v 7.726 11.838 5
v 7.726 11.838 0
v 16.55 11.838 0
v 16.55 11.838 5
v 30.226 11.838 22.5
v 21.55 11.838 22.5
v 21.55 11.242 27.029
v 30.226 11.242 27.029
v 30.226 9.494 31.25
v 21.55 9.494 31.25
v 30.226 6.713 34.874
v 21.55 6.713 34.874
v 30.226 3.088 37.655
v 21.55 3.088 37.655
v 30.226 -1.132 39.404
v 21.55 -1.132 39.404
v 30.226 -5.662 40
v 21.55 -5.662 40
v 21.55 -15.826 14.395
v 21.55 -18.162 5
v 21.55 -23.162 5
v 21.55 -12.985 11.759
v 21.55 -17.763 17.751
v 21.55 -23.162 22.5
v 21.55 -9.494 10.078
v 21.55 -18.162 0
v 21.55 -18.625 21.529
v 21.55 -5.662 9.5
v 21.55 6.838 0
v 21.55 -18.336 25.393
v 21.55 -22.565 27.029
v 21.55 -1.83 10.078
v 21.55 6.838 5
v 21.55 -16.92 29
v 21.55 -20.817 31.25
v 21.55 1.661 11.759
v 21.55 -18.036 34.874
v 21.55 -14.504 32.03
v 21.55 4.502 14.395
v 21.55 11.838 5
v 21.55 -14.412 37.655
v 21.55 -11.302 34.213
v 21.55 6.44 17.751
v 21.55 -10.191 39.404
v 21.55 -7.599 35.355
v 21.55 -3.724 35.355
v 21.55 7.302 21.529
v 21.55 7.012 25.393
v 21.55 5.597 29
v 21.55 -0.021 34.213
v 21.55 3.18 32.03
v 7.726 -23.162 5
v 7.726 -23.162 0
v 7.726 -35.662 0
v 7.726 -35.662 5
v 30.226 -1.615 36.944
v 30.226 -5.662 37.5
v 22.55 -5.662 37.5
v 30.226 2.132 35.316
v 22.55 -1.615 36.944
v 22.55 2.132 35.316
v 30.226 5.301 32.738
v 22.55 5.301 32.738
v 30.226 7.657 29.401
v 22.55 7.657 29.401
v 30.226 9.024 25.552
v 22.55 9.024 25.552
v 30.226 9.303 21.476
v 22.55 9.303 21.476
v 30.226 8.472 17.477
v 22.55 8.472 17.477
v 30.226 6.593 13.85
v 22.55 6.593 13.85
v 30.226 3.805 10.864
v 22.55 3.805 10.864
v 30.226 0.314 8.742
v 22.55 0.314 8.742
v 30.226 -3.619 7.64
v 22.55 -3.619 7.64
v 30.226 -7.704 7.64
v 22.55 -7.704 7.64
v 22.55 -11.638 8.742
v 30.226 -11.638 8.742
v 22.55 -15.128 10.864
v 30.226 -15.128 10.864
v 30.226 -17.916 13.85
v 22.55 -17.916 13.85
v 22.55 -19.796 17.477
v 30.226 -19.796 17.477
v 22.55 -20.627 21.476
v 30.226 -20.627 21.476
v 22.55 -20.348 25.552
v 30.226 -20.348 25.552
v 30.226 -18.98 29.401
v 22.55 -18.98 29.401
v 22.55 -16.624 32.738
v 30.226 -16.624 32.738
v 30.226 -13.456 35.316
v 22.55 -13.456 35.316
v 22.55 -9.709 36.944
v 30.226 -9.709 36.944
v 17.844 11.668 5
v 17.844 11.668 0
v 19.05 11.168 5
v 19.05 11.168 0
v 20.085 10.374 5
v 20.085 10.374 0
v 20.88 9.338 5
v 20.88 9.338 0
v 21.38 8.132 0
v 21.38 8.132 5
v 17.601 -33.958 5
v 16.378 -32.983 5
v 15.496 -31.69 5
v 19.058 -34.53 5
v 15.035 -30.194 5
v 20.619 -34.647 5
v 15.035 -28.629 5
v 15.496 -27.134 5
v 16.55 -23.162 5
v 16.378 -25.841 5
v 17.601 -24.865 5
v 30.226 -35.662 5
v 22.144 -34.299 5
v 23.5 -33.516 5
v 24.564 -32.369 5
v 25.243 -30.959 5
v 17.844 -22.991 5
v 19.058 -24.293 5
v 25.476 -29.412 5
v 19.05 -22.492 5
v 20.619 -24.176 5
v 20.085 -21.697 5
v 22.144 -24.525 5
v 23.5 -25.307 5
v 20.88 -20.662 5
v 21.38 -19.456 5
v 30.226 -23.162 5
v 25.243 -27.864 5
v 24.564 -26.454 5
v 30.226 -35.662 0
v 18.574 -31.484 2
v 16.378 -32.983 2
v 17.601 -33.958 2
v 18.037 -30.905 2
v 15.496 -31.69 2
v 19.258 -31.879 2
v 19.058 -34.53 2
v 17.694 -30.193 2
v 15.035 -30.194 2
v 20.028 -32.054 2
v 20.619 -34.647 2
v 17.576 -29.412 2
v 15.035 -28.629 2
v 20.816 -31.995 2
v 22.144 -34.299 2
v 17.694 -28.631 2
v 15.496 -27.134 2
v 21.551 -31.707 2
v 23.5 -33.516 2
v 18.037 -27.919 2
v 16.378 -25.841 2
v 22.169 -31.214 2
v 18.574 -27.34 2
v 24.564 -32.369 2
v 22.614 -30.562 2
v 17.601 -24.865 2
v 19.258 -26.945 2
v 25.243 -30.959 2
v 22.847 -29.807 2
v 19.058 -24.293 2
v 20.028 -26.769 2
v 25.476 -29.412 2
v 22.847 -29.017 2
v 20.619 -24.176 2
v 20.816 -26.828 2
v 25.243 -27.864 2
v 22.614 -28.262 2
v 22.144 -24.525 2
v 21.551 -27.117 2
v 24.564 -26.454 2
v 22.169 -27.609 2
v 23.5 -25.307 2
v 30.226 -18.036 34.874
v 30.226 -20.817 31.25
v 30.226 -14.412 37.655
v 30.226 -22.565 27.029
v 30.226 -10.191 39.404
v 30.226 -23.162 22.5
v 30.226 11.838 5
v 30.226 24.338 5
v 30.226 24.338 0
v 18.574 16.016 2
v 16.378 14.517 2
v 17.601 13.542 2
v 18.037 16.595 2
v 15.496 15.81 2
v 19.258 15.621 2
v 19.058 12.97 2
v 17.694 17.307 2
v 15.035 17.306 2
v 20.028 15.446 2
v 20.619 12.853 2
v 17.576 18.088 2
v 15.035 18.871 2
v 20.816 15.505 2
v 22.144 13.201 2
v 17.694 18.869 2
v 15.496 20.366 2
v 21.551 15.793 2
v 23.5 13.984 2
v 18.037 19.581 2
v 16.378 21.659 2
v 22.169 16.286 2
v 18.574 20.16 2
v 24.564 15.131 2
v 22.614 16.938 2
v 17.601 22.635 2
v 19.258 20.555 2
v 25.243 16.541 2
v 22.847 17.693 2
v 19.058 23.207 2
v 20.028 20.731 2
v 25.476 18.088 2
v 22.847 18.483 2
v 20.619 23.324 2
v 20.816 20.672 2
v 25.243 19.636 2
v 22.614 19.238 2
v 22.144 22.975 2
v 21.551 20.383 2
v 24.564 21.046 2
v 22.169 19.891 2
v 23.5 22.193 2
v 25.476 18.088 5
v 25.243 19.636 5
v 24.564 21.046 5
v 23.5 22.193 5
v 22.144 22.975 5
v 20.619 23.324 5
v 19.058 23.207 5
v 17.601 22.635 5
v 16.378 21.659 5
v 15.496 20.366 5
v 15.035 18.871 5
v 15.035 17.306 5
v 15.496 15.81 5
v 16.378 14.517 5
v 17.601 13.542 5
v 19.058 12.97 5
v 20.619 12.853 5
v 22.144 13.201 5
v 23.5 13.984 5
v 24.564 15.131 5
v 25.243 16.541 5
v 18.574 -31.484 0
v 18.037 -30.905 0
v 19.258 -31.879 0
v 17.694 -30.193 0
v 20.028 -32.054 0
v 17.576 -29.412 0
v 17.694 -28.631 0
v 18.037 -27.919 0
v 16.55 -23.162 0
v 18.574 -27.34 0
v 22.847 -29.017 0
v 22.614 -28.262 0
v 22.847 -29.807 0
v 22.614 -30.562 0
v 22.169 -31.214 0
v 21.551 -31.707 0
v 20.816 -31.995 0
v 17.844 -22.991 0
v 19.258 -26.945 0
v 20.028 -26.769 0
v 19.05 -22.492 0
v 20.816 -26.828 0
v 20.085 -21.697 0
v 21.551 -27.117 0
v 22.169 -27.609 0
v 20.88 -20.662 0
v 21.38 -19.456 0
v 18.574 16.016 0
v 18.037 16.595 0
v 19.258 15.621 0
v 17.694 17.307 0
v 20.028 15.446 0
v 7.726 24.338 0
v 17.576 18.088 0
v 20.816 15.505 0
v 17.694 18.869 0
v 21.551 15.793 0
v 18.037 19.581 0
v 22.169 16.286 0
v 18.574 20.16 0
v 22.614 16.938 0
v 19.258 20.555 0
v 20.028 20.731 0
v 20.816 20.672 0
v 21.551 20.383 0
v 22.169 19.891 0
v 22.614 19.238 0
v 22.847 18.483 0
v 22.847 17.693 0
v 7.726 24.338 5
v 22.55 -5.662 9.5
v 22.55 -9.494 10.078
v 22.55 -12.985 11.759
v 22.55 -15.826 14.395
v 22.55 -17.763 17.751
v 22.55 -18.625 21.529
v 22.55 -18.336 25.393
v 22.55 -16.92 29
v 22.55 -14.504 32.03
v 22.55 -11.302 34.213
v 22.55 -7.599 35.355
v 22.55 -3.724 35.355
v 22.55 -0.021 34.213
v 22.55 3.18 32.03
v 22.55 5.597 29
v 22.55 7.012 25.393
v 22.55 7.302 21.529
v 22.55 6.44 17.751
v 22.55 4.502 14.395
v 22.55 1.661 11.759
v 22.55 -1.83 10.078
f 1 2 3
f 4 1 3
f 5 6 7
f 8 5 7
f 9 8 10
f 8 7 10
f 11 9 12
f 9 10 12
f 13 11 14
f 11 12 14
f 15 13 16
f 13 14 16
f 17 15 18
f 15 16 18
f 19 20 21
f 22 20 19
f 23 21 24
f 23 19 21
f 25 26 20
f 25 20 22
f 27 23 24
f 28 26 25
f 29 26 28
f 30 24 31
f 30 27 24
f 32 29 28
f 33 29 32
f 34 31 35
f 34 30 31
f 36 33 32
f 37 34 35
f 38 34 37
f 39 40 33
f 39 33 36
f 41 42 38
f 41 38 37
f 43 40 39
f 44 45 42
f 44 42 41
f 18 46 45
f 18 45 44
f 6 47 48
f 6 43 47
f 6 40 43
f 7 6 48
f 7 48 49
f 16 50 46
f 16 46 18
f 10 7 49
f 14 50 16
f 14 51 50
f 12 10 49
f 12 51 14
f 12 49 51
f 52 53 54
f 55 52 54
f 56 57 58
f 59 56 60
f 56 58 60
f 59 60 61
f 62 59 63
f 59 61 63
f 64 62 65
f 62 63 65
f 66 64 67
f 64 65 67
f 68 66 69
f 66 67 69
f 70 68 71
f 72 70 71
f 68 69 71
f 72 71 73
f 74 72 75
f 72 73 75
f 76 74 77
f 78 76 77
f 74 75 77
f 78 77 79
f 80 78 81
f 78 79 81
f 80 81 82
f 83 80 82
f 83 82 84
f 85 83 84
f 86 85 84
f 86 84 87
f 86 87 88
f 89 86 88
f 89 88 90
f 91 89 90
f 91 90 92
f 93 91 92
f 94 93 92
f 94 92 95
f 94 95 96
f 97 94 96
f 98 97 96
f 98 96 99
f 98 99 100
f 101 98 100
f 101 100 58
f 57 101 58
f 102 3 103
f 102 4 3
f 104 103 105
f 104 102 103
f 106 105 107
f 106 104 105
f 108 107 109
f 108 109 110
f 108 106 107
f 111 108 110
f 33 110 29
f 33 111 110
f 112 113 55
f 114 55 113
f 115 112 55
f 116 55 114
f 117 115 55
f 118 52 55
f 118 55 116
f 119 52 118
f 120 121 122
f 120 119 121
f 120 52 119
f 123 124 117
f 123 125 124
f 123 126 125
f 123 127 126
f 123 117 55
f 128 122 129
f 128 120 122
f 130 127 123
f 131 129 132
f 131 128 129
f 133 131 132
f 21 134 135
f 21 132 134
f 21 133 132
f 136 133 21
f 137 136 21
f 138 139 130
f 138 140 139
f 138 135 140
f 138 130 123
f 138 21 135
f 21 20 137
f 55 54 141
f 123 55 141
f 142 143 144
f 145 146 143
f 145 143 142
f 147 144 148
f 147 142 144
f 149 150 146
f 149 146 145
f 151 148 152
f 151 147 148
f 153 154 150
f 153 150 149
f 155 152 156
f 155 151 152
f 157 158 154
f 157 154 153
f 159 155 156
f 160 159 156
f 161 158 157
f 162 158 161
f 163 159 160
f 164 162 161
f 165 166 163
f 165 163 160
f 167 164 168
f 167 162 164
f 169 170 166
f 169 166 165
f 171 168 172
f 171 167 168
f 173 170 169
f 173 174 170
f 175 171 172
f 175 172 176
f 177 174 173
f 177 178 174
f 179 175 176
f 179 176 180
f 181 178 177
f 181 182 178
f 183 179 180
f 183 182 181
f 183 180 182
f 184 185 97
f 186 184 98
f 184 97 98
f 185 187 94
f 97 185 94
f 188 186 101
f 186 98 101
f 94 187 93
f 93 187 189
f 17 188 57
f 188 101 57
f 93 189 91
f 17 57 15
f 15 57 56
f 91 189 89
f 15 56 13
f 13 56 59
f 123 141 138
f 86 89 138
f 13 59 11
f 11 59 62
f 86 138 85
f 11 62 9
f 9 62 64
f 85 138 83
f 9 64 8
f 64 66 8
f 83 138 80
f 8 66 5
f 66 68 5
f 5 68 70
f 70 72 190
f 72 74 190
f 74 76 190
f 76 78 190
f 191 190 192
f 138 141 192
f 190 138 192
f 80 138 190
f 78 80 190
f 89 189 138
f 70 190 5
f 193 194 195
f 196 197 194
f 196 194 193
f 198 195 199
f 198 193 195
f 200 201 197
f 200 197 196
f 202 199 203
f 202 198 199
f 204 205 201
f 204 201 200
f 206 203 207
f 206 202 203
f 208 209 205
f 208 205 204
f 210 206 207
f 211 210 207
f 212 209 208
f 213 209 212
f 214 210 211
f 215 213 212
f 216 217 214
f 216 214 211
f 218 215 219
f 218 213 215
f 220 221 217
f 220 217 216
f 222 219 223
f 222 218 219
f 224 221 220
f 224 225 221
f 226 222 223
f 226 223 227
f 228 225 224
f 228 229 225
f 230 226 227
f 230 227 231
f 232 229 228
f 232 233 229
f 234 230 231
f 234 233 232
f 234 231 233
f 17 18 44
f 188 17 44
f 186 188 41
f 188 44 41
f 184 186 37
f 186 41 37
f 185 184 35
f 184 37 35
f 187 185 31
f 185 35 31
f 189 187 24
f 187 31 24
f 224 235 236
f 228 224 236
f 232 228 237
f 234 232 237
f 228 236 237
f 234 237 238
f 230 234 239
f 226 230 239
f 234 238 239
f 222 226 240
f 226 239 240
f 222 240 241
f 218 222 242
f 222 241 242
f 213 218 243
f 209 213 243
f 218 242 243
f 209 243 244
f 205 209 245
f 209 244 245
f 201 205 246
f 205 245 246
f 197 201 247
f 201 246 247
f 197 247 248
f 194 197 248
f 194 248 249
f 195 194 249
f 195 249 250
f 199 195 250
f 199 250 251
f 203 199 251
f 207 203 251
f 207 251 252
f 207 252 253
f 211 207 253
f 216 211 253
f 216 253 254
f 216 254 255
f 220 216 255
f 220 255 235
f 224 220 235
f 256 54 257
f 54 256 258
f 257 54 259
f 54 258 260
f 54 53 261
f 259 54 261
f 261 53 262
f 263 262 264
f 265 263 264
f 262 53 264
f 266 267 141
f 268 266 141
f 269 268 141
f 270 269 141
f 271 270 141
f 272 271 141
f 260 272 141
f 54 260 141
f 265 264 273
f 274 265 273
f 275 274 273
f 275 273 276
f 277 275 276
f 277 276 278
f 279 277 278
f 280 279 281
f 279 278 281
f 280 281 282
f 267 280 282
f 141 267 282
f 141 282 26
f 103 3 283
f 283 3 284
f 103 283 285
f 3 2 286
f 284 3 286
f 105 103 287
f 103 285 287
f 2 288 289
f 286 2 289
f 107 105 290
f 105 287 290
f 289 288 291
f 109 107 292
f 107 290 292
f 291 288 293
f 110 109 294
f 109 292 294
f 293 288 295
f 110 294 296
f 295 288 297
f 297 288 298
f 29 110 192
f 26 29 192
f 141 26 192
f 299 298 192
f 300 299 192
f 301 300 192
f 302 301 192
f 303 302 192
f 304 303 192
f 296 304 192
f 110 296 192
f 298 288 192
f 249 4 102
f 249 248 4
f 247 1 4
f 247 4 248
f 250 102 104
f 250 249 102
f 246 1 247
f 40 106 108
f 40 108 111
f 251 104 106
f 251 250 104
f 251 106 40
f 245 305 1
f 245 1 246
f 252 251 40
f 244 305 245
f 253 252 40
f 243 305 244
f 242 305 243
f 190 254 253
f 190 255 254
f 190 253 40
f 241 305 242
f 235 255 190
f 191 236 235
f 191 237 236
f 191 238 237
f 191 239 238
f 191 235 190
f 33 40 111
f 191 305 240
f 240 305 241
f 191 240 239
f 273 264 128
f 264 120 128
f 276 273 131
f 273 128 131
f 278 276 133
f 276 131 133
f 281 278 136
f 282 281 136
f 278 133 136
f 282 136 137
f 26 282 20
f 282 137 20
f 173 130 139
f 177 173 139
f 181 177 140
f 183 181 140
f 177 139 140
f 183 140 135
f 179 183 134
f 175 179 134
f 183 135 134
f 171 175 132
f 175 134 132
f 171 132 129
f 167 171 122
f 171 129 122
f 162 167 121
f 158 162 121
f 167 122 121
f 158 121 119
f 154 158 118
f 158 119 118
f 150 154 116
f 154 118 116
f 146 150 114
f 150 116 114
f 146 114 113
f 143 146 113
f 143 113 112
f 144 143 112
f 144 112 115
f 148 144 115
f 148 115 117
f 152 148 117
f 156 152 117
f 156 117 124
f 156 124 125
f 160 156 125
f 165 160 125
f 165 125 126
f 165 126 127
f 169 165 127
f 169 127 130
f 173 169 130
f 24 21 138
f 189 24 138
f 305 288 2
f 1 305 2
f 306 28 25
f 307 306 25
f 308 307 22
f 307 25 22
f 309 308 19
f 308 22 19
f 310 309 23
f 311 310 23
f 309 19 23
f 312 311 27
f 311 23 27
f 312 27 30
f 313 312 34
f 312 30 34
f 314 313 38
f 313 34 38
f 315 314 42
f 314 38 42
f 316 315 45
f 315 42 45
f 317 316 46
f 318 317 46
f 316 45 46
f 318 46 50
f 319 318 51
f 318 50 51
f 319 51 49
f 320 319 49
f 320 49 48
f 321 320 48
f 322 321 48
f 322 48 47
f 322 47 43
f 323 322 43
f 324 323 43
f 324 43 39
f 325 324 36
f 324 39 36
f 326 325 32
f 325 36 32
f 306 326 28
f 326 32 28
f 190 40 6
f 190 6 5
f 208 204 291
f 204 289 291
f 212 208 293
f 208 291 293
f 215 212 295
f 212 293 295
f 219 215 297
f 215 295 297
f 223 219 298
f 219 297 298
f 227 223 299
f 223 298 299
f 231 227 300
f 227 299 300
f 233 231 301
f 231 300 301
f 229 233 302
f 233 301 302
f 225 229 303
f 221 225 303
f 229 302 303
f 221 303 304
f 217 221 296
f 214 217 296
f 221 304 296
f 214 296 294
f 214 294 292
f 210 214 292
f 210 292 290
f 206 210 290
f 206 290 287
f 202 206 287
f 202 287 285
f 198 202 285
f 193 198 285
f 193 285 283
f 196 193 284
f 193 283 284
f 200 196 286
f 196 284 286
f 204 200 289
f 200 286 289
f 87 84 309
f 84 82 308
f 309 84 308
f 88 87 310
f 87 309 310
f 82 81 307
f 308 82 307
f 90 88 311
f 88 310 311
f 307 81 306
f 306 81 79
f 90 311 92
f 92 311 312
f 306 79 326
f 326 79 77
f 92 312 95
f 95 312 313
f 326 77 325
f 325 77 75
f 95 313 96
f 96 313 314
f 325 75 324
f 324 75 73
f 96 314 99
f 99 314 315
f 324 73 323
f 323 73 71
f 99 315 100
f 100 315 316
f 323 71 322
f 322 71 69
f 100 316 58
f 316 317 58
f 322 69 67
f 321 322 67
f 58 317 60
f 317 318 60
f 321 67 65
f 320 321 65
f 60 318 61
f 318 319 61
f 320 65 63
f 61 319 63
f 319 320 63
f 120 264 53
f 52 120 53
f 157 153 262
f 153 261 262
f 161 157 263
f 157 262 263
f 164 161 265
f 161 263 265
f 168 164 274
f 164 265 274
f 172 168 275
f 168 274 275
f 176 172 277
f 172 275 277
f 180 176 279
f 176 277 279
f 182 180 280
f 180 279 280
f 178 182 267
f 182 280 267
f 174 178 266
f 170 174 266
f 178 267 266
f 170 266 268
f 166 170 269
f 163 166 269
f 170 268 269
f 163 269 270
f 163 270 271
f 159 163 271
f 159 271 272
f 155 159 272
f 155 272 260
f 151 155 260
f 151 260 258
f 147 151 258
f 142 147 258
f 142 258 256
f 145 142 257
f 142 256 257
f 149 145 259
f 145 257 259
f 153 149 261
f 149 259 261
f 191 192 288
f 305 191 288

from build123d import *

# Parameters (mm, degrees)
EXTRUDE_2_DEPTH                = 5
SKETCH_4_W                     = 8.676470589
SKETCH_4_H                     = 35
SKETCH_4_W_2                   = 8.676470588
EXTRUDE_15_DEPTH               = 35
CUT_EXTRUDE_1_DEPTH            = 45
SKETCH_6_R                     = 15
CUT_EXTRUDE_2_DEPTH            = 45
FILLET_1_R                     = 5
EXTRUDE_START                  = -1
SKETCH_7_R                     = 15
SKETCH_7_R_2                   = 13
EXTRUDE_16_DEPTH               = 1
SKETCH_8_R                     = 15
SKETCH_8_R_2                   = 13
EXTRUDE_17_DEPTH               = 1
SPLIT_BODIES_1_SURFACE_1_BACK  = 86
SPLIT_BODIES_1_SURFACE_1_DEPTH = 172
SPLIT_BODIES_1_SURFACE_2_BACK  = 86
SPLIT_BODIES_1_SURFACE_2_DEPTH = 172
HOLE_WIZARD_1_D                = 5.3
HOLE_WIZARD_1_CBORE_D          = 10.5
HOLE_WIZARD_1_CBORE_DEPTH      = 3


with BuildPart() as part:
    # 草图2 → 凸台-拉伸2 (new body)
    with BuildSketch(Plane.XY):
        Polygon((7.726423565, 24.338235294), (-14.773576435, 24.338235294), (-14.773576435, -35.661764706), (7.726423565, -35.661764706), (7.726423565, -23.161764706), (-6.097105846, -23.161764706), (-6.097105846, 11.838235294), (7.726423565, 11.838235294), align=None)
        Polygon((30.226423565, 24.338235294), (7.726423565, 24.338235294), (7.726423565, 11.838235294), (21.549952977, 11.838235294), (21.549952977, -23.161764706), (7.726423565, -23.161764706), (7.726423565, -35.661764706), (30.226423565, -35.661764706), align=None)
    extrude(amount=EXTRUDE_2_DEPTH)

    # 草图4 → 凸台-拉伸15 (add)
    with BuildSketch(Plane.XY.offset(5)):
        with Locations((-10.435341141, -5.661764706)):
            Rectangle(SKETCH_4_W, SKETCH_4_H)
        with Locations((25.888188271, -5.661764706)):
            Rectangle(SKETCH_4_W_2, SKETCH_4_H)
    extrude(amount=EXTRUDE_15_DEPTH)

    # 草图5 → 切除-拉伸1 (cut)
    with BuildSketch(Plane.ZY.offset(14.773576435)):
        with BuildLine():
            Line((40, -23.161764706), (40, -5.661764706))
            ThreePointArc((40, -5.661764706), (34.874368671, -18.036133377), (22.5, -23.161764706))
            Line((22.5, -23.161764706), (40, -23.161764706))
        make_face()
        with BuildLine():
            ThreePointArc((22.5, 11.838235294), (34.874368671, 6.712603965), (40, -5.661764706))
            Line((40, -5.661764706), (40, 11.838235294))
            Line((40, 11.838235294), (22.5, 11.838235294))
        make_face()
    extrude(amount=-CUT_EXTRUDE_1_DEPTH, mode=Mode.SUBTRACT)

    # 草图6 → 切除-拉伸2 (cut)
    with BuildSketch(Plane.ZY.offset(14.773576435)):
        with Locations((22.5, -5.661764706)):
            Circle(SKETCH_6_R)
    extrude(amount=-CUT_EXTRUDE_2_DEPTH, mode=Mode.SUBTRACT)

    # 圆角1
    fillet_1_edges = [part.edges().sort_by_distance(p)[0] for p in [
        (-6.097105846, 11.838235294, 2.5),
        (-6.097105846, -23.161764706, 2.5),
        (21.549952977, -23.161764706, 2.5),
        (21.549952977, 11.838235294, 2.5),
    ]]
    fillet(fillet_1_edges, radius=FILLET_1_R)

    # 草图7 → 凸台-拉伸16 (add)
    with BuildSketch(Plane(origin=(-6.097105846, 0, 0), x_dir=(0, 0, -1), z_dir=(1, 0, 0)).offset(EXTRUDE_START)):
        with Locations(Location((-22.5, -5.661764706, 0), (0, 0, 180))):
            Circle(SKETCH_7_R)
        with Locations((-22.5, -5.661764706)):
            Circle(SKETCH_7_R_2, mode=Mode.SUBTRACT)
    extrude(amount=EXTRUDE_16_DEPTH)

    # 草图8 → 凸台-拉伸17 (add)
    with BuildSketch(Plane.ZY.offset(-21.549952977)):
        with Locations((22.5, -5.661764706)):
            Circle(SKETCH_8_R)
        with Locations(Location((22.5, -5.661764706, 0), (0, 0, 180))):
            Circle(SKETCH_8_R_2, mode=Mode.SUBTRACT)
    extrude(amount=-EXTRUDE_17_DEPTH)


with BuildPart() as body_2:
    # Split Bodies 1: the piece behind the surface
    add(part.part)
    # Split Bodies 1 surface: a surface, the sketch's curves swept straight by 172 mm
    with BuildLine(Plane.XY.offset(5).offset(-SPLIT_BODIES_1_SURFACE_1_BACK), mode=Mode.PRIVATE) as split_bodies_1_surface_1_path:
        Line((7.726423565, 24.338235294), (7.726423565, -35.661764706))
    split_bodies_1_surface_1 = Shell.extrude(split_bodies_1_surface_1_path.wire(), (0 * SPLIT_BODIES_1_SURFACE_1_DEPTH, 0 * SPLIT_BODIES_1_SURFACE_1_DEPTH, 1 * SPLIT_BODIES_1_SURFACE_1_DEPTH))
    split(bisect_by=split_bodies_1_surface_1, keep=Keep.BOTTOM)


with BuildPart() as part_1:
    add(part.part)

    # Split Bodies 1: split by a surface, the side it looks to stays
    # Split Bodies 1 surface: a surface, the sketch's curves swept straight by 172 mm
    with BuildLine(Plane.XY.offset(5).offset(-SPLIT_BODIES_1_SURFACE_2_BACK), mode=Mode.PRIVATE) as split_bodies_1_surface_2_path:
        Line((7.726423565, 24.338235294), (7.726423565, -35.661764706))
    split_bodies_1_surface_2 = Shell.extrude(split_bodies_1_surface_2_path.wire(), (0 * SPLIT_BODIES_1_SURFACE_2_DEPTH, 0 * SPLIT_BODIES_1_SURFACE_2_DEPTH, 1 * SPLIT_BODIES_1_SURFACE_2_DEPTH))
    split(bisect_by=split_bodies_1_surface_2, keep=Keep.TOP)

    # 大小平盘开槽螺钉柱孔1 (through all)
    with Locations(Plane(origin=(20.226423565, -29.411764706, 5), x_dir=(1, 0, 0), z_dir=(0, 0, 1))):
        with Locations((0, 0), (0, 47.5)):
            CounterBoreHole(HOLE_WIZARD_1_D / 2, HOLE_WIZARD_1_CBORE_D / 2, HOLE_WIZARD_1_CBORE_DEPTH)


solid = part_1.part
